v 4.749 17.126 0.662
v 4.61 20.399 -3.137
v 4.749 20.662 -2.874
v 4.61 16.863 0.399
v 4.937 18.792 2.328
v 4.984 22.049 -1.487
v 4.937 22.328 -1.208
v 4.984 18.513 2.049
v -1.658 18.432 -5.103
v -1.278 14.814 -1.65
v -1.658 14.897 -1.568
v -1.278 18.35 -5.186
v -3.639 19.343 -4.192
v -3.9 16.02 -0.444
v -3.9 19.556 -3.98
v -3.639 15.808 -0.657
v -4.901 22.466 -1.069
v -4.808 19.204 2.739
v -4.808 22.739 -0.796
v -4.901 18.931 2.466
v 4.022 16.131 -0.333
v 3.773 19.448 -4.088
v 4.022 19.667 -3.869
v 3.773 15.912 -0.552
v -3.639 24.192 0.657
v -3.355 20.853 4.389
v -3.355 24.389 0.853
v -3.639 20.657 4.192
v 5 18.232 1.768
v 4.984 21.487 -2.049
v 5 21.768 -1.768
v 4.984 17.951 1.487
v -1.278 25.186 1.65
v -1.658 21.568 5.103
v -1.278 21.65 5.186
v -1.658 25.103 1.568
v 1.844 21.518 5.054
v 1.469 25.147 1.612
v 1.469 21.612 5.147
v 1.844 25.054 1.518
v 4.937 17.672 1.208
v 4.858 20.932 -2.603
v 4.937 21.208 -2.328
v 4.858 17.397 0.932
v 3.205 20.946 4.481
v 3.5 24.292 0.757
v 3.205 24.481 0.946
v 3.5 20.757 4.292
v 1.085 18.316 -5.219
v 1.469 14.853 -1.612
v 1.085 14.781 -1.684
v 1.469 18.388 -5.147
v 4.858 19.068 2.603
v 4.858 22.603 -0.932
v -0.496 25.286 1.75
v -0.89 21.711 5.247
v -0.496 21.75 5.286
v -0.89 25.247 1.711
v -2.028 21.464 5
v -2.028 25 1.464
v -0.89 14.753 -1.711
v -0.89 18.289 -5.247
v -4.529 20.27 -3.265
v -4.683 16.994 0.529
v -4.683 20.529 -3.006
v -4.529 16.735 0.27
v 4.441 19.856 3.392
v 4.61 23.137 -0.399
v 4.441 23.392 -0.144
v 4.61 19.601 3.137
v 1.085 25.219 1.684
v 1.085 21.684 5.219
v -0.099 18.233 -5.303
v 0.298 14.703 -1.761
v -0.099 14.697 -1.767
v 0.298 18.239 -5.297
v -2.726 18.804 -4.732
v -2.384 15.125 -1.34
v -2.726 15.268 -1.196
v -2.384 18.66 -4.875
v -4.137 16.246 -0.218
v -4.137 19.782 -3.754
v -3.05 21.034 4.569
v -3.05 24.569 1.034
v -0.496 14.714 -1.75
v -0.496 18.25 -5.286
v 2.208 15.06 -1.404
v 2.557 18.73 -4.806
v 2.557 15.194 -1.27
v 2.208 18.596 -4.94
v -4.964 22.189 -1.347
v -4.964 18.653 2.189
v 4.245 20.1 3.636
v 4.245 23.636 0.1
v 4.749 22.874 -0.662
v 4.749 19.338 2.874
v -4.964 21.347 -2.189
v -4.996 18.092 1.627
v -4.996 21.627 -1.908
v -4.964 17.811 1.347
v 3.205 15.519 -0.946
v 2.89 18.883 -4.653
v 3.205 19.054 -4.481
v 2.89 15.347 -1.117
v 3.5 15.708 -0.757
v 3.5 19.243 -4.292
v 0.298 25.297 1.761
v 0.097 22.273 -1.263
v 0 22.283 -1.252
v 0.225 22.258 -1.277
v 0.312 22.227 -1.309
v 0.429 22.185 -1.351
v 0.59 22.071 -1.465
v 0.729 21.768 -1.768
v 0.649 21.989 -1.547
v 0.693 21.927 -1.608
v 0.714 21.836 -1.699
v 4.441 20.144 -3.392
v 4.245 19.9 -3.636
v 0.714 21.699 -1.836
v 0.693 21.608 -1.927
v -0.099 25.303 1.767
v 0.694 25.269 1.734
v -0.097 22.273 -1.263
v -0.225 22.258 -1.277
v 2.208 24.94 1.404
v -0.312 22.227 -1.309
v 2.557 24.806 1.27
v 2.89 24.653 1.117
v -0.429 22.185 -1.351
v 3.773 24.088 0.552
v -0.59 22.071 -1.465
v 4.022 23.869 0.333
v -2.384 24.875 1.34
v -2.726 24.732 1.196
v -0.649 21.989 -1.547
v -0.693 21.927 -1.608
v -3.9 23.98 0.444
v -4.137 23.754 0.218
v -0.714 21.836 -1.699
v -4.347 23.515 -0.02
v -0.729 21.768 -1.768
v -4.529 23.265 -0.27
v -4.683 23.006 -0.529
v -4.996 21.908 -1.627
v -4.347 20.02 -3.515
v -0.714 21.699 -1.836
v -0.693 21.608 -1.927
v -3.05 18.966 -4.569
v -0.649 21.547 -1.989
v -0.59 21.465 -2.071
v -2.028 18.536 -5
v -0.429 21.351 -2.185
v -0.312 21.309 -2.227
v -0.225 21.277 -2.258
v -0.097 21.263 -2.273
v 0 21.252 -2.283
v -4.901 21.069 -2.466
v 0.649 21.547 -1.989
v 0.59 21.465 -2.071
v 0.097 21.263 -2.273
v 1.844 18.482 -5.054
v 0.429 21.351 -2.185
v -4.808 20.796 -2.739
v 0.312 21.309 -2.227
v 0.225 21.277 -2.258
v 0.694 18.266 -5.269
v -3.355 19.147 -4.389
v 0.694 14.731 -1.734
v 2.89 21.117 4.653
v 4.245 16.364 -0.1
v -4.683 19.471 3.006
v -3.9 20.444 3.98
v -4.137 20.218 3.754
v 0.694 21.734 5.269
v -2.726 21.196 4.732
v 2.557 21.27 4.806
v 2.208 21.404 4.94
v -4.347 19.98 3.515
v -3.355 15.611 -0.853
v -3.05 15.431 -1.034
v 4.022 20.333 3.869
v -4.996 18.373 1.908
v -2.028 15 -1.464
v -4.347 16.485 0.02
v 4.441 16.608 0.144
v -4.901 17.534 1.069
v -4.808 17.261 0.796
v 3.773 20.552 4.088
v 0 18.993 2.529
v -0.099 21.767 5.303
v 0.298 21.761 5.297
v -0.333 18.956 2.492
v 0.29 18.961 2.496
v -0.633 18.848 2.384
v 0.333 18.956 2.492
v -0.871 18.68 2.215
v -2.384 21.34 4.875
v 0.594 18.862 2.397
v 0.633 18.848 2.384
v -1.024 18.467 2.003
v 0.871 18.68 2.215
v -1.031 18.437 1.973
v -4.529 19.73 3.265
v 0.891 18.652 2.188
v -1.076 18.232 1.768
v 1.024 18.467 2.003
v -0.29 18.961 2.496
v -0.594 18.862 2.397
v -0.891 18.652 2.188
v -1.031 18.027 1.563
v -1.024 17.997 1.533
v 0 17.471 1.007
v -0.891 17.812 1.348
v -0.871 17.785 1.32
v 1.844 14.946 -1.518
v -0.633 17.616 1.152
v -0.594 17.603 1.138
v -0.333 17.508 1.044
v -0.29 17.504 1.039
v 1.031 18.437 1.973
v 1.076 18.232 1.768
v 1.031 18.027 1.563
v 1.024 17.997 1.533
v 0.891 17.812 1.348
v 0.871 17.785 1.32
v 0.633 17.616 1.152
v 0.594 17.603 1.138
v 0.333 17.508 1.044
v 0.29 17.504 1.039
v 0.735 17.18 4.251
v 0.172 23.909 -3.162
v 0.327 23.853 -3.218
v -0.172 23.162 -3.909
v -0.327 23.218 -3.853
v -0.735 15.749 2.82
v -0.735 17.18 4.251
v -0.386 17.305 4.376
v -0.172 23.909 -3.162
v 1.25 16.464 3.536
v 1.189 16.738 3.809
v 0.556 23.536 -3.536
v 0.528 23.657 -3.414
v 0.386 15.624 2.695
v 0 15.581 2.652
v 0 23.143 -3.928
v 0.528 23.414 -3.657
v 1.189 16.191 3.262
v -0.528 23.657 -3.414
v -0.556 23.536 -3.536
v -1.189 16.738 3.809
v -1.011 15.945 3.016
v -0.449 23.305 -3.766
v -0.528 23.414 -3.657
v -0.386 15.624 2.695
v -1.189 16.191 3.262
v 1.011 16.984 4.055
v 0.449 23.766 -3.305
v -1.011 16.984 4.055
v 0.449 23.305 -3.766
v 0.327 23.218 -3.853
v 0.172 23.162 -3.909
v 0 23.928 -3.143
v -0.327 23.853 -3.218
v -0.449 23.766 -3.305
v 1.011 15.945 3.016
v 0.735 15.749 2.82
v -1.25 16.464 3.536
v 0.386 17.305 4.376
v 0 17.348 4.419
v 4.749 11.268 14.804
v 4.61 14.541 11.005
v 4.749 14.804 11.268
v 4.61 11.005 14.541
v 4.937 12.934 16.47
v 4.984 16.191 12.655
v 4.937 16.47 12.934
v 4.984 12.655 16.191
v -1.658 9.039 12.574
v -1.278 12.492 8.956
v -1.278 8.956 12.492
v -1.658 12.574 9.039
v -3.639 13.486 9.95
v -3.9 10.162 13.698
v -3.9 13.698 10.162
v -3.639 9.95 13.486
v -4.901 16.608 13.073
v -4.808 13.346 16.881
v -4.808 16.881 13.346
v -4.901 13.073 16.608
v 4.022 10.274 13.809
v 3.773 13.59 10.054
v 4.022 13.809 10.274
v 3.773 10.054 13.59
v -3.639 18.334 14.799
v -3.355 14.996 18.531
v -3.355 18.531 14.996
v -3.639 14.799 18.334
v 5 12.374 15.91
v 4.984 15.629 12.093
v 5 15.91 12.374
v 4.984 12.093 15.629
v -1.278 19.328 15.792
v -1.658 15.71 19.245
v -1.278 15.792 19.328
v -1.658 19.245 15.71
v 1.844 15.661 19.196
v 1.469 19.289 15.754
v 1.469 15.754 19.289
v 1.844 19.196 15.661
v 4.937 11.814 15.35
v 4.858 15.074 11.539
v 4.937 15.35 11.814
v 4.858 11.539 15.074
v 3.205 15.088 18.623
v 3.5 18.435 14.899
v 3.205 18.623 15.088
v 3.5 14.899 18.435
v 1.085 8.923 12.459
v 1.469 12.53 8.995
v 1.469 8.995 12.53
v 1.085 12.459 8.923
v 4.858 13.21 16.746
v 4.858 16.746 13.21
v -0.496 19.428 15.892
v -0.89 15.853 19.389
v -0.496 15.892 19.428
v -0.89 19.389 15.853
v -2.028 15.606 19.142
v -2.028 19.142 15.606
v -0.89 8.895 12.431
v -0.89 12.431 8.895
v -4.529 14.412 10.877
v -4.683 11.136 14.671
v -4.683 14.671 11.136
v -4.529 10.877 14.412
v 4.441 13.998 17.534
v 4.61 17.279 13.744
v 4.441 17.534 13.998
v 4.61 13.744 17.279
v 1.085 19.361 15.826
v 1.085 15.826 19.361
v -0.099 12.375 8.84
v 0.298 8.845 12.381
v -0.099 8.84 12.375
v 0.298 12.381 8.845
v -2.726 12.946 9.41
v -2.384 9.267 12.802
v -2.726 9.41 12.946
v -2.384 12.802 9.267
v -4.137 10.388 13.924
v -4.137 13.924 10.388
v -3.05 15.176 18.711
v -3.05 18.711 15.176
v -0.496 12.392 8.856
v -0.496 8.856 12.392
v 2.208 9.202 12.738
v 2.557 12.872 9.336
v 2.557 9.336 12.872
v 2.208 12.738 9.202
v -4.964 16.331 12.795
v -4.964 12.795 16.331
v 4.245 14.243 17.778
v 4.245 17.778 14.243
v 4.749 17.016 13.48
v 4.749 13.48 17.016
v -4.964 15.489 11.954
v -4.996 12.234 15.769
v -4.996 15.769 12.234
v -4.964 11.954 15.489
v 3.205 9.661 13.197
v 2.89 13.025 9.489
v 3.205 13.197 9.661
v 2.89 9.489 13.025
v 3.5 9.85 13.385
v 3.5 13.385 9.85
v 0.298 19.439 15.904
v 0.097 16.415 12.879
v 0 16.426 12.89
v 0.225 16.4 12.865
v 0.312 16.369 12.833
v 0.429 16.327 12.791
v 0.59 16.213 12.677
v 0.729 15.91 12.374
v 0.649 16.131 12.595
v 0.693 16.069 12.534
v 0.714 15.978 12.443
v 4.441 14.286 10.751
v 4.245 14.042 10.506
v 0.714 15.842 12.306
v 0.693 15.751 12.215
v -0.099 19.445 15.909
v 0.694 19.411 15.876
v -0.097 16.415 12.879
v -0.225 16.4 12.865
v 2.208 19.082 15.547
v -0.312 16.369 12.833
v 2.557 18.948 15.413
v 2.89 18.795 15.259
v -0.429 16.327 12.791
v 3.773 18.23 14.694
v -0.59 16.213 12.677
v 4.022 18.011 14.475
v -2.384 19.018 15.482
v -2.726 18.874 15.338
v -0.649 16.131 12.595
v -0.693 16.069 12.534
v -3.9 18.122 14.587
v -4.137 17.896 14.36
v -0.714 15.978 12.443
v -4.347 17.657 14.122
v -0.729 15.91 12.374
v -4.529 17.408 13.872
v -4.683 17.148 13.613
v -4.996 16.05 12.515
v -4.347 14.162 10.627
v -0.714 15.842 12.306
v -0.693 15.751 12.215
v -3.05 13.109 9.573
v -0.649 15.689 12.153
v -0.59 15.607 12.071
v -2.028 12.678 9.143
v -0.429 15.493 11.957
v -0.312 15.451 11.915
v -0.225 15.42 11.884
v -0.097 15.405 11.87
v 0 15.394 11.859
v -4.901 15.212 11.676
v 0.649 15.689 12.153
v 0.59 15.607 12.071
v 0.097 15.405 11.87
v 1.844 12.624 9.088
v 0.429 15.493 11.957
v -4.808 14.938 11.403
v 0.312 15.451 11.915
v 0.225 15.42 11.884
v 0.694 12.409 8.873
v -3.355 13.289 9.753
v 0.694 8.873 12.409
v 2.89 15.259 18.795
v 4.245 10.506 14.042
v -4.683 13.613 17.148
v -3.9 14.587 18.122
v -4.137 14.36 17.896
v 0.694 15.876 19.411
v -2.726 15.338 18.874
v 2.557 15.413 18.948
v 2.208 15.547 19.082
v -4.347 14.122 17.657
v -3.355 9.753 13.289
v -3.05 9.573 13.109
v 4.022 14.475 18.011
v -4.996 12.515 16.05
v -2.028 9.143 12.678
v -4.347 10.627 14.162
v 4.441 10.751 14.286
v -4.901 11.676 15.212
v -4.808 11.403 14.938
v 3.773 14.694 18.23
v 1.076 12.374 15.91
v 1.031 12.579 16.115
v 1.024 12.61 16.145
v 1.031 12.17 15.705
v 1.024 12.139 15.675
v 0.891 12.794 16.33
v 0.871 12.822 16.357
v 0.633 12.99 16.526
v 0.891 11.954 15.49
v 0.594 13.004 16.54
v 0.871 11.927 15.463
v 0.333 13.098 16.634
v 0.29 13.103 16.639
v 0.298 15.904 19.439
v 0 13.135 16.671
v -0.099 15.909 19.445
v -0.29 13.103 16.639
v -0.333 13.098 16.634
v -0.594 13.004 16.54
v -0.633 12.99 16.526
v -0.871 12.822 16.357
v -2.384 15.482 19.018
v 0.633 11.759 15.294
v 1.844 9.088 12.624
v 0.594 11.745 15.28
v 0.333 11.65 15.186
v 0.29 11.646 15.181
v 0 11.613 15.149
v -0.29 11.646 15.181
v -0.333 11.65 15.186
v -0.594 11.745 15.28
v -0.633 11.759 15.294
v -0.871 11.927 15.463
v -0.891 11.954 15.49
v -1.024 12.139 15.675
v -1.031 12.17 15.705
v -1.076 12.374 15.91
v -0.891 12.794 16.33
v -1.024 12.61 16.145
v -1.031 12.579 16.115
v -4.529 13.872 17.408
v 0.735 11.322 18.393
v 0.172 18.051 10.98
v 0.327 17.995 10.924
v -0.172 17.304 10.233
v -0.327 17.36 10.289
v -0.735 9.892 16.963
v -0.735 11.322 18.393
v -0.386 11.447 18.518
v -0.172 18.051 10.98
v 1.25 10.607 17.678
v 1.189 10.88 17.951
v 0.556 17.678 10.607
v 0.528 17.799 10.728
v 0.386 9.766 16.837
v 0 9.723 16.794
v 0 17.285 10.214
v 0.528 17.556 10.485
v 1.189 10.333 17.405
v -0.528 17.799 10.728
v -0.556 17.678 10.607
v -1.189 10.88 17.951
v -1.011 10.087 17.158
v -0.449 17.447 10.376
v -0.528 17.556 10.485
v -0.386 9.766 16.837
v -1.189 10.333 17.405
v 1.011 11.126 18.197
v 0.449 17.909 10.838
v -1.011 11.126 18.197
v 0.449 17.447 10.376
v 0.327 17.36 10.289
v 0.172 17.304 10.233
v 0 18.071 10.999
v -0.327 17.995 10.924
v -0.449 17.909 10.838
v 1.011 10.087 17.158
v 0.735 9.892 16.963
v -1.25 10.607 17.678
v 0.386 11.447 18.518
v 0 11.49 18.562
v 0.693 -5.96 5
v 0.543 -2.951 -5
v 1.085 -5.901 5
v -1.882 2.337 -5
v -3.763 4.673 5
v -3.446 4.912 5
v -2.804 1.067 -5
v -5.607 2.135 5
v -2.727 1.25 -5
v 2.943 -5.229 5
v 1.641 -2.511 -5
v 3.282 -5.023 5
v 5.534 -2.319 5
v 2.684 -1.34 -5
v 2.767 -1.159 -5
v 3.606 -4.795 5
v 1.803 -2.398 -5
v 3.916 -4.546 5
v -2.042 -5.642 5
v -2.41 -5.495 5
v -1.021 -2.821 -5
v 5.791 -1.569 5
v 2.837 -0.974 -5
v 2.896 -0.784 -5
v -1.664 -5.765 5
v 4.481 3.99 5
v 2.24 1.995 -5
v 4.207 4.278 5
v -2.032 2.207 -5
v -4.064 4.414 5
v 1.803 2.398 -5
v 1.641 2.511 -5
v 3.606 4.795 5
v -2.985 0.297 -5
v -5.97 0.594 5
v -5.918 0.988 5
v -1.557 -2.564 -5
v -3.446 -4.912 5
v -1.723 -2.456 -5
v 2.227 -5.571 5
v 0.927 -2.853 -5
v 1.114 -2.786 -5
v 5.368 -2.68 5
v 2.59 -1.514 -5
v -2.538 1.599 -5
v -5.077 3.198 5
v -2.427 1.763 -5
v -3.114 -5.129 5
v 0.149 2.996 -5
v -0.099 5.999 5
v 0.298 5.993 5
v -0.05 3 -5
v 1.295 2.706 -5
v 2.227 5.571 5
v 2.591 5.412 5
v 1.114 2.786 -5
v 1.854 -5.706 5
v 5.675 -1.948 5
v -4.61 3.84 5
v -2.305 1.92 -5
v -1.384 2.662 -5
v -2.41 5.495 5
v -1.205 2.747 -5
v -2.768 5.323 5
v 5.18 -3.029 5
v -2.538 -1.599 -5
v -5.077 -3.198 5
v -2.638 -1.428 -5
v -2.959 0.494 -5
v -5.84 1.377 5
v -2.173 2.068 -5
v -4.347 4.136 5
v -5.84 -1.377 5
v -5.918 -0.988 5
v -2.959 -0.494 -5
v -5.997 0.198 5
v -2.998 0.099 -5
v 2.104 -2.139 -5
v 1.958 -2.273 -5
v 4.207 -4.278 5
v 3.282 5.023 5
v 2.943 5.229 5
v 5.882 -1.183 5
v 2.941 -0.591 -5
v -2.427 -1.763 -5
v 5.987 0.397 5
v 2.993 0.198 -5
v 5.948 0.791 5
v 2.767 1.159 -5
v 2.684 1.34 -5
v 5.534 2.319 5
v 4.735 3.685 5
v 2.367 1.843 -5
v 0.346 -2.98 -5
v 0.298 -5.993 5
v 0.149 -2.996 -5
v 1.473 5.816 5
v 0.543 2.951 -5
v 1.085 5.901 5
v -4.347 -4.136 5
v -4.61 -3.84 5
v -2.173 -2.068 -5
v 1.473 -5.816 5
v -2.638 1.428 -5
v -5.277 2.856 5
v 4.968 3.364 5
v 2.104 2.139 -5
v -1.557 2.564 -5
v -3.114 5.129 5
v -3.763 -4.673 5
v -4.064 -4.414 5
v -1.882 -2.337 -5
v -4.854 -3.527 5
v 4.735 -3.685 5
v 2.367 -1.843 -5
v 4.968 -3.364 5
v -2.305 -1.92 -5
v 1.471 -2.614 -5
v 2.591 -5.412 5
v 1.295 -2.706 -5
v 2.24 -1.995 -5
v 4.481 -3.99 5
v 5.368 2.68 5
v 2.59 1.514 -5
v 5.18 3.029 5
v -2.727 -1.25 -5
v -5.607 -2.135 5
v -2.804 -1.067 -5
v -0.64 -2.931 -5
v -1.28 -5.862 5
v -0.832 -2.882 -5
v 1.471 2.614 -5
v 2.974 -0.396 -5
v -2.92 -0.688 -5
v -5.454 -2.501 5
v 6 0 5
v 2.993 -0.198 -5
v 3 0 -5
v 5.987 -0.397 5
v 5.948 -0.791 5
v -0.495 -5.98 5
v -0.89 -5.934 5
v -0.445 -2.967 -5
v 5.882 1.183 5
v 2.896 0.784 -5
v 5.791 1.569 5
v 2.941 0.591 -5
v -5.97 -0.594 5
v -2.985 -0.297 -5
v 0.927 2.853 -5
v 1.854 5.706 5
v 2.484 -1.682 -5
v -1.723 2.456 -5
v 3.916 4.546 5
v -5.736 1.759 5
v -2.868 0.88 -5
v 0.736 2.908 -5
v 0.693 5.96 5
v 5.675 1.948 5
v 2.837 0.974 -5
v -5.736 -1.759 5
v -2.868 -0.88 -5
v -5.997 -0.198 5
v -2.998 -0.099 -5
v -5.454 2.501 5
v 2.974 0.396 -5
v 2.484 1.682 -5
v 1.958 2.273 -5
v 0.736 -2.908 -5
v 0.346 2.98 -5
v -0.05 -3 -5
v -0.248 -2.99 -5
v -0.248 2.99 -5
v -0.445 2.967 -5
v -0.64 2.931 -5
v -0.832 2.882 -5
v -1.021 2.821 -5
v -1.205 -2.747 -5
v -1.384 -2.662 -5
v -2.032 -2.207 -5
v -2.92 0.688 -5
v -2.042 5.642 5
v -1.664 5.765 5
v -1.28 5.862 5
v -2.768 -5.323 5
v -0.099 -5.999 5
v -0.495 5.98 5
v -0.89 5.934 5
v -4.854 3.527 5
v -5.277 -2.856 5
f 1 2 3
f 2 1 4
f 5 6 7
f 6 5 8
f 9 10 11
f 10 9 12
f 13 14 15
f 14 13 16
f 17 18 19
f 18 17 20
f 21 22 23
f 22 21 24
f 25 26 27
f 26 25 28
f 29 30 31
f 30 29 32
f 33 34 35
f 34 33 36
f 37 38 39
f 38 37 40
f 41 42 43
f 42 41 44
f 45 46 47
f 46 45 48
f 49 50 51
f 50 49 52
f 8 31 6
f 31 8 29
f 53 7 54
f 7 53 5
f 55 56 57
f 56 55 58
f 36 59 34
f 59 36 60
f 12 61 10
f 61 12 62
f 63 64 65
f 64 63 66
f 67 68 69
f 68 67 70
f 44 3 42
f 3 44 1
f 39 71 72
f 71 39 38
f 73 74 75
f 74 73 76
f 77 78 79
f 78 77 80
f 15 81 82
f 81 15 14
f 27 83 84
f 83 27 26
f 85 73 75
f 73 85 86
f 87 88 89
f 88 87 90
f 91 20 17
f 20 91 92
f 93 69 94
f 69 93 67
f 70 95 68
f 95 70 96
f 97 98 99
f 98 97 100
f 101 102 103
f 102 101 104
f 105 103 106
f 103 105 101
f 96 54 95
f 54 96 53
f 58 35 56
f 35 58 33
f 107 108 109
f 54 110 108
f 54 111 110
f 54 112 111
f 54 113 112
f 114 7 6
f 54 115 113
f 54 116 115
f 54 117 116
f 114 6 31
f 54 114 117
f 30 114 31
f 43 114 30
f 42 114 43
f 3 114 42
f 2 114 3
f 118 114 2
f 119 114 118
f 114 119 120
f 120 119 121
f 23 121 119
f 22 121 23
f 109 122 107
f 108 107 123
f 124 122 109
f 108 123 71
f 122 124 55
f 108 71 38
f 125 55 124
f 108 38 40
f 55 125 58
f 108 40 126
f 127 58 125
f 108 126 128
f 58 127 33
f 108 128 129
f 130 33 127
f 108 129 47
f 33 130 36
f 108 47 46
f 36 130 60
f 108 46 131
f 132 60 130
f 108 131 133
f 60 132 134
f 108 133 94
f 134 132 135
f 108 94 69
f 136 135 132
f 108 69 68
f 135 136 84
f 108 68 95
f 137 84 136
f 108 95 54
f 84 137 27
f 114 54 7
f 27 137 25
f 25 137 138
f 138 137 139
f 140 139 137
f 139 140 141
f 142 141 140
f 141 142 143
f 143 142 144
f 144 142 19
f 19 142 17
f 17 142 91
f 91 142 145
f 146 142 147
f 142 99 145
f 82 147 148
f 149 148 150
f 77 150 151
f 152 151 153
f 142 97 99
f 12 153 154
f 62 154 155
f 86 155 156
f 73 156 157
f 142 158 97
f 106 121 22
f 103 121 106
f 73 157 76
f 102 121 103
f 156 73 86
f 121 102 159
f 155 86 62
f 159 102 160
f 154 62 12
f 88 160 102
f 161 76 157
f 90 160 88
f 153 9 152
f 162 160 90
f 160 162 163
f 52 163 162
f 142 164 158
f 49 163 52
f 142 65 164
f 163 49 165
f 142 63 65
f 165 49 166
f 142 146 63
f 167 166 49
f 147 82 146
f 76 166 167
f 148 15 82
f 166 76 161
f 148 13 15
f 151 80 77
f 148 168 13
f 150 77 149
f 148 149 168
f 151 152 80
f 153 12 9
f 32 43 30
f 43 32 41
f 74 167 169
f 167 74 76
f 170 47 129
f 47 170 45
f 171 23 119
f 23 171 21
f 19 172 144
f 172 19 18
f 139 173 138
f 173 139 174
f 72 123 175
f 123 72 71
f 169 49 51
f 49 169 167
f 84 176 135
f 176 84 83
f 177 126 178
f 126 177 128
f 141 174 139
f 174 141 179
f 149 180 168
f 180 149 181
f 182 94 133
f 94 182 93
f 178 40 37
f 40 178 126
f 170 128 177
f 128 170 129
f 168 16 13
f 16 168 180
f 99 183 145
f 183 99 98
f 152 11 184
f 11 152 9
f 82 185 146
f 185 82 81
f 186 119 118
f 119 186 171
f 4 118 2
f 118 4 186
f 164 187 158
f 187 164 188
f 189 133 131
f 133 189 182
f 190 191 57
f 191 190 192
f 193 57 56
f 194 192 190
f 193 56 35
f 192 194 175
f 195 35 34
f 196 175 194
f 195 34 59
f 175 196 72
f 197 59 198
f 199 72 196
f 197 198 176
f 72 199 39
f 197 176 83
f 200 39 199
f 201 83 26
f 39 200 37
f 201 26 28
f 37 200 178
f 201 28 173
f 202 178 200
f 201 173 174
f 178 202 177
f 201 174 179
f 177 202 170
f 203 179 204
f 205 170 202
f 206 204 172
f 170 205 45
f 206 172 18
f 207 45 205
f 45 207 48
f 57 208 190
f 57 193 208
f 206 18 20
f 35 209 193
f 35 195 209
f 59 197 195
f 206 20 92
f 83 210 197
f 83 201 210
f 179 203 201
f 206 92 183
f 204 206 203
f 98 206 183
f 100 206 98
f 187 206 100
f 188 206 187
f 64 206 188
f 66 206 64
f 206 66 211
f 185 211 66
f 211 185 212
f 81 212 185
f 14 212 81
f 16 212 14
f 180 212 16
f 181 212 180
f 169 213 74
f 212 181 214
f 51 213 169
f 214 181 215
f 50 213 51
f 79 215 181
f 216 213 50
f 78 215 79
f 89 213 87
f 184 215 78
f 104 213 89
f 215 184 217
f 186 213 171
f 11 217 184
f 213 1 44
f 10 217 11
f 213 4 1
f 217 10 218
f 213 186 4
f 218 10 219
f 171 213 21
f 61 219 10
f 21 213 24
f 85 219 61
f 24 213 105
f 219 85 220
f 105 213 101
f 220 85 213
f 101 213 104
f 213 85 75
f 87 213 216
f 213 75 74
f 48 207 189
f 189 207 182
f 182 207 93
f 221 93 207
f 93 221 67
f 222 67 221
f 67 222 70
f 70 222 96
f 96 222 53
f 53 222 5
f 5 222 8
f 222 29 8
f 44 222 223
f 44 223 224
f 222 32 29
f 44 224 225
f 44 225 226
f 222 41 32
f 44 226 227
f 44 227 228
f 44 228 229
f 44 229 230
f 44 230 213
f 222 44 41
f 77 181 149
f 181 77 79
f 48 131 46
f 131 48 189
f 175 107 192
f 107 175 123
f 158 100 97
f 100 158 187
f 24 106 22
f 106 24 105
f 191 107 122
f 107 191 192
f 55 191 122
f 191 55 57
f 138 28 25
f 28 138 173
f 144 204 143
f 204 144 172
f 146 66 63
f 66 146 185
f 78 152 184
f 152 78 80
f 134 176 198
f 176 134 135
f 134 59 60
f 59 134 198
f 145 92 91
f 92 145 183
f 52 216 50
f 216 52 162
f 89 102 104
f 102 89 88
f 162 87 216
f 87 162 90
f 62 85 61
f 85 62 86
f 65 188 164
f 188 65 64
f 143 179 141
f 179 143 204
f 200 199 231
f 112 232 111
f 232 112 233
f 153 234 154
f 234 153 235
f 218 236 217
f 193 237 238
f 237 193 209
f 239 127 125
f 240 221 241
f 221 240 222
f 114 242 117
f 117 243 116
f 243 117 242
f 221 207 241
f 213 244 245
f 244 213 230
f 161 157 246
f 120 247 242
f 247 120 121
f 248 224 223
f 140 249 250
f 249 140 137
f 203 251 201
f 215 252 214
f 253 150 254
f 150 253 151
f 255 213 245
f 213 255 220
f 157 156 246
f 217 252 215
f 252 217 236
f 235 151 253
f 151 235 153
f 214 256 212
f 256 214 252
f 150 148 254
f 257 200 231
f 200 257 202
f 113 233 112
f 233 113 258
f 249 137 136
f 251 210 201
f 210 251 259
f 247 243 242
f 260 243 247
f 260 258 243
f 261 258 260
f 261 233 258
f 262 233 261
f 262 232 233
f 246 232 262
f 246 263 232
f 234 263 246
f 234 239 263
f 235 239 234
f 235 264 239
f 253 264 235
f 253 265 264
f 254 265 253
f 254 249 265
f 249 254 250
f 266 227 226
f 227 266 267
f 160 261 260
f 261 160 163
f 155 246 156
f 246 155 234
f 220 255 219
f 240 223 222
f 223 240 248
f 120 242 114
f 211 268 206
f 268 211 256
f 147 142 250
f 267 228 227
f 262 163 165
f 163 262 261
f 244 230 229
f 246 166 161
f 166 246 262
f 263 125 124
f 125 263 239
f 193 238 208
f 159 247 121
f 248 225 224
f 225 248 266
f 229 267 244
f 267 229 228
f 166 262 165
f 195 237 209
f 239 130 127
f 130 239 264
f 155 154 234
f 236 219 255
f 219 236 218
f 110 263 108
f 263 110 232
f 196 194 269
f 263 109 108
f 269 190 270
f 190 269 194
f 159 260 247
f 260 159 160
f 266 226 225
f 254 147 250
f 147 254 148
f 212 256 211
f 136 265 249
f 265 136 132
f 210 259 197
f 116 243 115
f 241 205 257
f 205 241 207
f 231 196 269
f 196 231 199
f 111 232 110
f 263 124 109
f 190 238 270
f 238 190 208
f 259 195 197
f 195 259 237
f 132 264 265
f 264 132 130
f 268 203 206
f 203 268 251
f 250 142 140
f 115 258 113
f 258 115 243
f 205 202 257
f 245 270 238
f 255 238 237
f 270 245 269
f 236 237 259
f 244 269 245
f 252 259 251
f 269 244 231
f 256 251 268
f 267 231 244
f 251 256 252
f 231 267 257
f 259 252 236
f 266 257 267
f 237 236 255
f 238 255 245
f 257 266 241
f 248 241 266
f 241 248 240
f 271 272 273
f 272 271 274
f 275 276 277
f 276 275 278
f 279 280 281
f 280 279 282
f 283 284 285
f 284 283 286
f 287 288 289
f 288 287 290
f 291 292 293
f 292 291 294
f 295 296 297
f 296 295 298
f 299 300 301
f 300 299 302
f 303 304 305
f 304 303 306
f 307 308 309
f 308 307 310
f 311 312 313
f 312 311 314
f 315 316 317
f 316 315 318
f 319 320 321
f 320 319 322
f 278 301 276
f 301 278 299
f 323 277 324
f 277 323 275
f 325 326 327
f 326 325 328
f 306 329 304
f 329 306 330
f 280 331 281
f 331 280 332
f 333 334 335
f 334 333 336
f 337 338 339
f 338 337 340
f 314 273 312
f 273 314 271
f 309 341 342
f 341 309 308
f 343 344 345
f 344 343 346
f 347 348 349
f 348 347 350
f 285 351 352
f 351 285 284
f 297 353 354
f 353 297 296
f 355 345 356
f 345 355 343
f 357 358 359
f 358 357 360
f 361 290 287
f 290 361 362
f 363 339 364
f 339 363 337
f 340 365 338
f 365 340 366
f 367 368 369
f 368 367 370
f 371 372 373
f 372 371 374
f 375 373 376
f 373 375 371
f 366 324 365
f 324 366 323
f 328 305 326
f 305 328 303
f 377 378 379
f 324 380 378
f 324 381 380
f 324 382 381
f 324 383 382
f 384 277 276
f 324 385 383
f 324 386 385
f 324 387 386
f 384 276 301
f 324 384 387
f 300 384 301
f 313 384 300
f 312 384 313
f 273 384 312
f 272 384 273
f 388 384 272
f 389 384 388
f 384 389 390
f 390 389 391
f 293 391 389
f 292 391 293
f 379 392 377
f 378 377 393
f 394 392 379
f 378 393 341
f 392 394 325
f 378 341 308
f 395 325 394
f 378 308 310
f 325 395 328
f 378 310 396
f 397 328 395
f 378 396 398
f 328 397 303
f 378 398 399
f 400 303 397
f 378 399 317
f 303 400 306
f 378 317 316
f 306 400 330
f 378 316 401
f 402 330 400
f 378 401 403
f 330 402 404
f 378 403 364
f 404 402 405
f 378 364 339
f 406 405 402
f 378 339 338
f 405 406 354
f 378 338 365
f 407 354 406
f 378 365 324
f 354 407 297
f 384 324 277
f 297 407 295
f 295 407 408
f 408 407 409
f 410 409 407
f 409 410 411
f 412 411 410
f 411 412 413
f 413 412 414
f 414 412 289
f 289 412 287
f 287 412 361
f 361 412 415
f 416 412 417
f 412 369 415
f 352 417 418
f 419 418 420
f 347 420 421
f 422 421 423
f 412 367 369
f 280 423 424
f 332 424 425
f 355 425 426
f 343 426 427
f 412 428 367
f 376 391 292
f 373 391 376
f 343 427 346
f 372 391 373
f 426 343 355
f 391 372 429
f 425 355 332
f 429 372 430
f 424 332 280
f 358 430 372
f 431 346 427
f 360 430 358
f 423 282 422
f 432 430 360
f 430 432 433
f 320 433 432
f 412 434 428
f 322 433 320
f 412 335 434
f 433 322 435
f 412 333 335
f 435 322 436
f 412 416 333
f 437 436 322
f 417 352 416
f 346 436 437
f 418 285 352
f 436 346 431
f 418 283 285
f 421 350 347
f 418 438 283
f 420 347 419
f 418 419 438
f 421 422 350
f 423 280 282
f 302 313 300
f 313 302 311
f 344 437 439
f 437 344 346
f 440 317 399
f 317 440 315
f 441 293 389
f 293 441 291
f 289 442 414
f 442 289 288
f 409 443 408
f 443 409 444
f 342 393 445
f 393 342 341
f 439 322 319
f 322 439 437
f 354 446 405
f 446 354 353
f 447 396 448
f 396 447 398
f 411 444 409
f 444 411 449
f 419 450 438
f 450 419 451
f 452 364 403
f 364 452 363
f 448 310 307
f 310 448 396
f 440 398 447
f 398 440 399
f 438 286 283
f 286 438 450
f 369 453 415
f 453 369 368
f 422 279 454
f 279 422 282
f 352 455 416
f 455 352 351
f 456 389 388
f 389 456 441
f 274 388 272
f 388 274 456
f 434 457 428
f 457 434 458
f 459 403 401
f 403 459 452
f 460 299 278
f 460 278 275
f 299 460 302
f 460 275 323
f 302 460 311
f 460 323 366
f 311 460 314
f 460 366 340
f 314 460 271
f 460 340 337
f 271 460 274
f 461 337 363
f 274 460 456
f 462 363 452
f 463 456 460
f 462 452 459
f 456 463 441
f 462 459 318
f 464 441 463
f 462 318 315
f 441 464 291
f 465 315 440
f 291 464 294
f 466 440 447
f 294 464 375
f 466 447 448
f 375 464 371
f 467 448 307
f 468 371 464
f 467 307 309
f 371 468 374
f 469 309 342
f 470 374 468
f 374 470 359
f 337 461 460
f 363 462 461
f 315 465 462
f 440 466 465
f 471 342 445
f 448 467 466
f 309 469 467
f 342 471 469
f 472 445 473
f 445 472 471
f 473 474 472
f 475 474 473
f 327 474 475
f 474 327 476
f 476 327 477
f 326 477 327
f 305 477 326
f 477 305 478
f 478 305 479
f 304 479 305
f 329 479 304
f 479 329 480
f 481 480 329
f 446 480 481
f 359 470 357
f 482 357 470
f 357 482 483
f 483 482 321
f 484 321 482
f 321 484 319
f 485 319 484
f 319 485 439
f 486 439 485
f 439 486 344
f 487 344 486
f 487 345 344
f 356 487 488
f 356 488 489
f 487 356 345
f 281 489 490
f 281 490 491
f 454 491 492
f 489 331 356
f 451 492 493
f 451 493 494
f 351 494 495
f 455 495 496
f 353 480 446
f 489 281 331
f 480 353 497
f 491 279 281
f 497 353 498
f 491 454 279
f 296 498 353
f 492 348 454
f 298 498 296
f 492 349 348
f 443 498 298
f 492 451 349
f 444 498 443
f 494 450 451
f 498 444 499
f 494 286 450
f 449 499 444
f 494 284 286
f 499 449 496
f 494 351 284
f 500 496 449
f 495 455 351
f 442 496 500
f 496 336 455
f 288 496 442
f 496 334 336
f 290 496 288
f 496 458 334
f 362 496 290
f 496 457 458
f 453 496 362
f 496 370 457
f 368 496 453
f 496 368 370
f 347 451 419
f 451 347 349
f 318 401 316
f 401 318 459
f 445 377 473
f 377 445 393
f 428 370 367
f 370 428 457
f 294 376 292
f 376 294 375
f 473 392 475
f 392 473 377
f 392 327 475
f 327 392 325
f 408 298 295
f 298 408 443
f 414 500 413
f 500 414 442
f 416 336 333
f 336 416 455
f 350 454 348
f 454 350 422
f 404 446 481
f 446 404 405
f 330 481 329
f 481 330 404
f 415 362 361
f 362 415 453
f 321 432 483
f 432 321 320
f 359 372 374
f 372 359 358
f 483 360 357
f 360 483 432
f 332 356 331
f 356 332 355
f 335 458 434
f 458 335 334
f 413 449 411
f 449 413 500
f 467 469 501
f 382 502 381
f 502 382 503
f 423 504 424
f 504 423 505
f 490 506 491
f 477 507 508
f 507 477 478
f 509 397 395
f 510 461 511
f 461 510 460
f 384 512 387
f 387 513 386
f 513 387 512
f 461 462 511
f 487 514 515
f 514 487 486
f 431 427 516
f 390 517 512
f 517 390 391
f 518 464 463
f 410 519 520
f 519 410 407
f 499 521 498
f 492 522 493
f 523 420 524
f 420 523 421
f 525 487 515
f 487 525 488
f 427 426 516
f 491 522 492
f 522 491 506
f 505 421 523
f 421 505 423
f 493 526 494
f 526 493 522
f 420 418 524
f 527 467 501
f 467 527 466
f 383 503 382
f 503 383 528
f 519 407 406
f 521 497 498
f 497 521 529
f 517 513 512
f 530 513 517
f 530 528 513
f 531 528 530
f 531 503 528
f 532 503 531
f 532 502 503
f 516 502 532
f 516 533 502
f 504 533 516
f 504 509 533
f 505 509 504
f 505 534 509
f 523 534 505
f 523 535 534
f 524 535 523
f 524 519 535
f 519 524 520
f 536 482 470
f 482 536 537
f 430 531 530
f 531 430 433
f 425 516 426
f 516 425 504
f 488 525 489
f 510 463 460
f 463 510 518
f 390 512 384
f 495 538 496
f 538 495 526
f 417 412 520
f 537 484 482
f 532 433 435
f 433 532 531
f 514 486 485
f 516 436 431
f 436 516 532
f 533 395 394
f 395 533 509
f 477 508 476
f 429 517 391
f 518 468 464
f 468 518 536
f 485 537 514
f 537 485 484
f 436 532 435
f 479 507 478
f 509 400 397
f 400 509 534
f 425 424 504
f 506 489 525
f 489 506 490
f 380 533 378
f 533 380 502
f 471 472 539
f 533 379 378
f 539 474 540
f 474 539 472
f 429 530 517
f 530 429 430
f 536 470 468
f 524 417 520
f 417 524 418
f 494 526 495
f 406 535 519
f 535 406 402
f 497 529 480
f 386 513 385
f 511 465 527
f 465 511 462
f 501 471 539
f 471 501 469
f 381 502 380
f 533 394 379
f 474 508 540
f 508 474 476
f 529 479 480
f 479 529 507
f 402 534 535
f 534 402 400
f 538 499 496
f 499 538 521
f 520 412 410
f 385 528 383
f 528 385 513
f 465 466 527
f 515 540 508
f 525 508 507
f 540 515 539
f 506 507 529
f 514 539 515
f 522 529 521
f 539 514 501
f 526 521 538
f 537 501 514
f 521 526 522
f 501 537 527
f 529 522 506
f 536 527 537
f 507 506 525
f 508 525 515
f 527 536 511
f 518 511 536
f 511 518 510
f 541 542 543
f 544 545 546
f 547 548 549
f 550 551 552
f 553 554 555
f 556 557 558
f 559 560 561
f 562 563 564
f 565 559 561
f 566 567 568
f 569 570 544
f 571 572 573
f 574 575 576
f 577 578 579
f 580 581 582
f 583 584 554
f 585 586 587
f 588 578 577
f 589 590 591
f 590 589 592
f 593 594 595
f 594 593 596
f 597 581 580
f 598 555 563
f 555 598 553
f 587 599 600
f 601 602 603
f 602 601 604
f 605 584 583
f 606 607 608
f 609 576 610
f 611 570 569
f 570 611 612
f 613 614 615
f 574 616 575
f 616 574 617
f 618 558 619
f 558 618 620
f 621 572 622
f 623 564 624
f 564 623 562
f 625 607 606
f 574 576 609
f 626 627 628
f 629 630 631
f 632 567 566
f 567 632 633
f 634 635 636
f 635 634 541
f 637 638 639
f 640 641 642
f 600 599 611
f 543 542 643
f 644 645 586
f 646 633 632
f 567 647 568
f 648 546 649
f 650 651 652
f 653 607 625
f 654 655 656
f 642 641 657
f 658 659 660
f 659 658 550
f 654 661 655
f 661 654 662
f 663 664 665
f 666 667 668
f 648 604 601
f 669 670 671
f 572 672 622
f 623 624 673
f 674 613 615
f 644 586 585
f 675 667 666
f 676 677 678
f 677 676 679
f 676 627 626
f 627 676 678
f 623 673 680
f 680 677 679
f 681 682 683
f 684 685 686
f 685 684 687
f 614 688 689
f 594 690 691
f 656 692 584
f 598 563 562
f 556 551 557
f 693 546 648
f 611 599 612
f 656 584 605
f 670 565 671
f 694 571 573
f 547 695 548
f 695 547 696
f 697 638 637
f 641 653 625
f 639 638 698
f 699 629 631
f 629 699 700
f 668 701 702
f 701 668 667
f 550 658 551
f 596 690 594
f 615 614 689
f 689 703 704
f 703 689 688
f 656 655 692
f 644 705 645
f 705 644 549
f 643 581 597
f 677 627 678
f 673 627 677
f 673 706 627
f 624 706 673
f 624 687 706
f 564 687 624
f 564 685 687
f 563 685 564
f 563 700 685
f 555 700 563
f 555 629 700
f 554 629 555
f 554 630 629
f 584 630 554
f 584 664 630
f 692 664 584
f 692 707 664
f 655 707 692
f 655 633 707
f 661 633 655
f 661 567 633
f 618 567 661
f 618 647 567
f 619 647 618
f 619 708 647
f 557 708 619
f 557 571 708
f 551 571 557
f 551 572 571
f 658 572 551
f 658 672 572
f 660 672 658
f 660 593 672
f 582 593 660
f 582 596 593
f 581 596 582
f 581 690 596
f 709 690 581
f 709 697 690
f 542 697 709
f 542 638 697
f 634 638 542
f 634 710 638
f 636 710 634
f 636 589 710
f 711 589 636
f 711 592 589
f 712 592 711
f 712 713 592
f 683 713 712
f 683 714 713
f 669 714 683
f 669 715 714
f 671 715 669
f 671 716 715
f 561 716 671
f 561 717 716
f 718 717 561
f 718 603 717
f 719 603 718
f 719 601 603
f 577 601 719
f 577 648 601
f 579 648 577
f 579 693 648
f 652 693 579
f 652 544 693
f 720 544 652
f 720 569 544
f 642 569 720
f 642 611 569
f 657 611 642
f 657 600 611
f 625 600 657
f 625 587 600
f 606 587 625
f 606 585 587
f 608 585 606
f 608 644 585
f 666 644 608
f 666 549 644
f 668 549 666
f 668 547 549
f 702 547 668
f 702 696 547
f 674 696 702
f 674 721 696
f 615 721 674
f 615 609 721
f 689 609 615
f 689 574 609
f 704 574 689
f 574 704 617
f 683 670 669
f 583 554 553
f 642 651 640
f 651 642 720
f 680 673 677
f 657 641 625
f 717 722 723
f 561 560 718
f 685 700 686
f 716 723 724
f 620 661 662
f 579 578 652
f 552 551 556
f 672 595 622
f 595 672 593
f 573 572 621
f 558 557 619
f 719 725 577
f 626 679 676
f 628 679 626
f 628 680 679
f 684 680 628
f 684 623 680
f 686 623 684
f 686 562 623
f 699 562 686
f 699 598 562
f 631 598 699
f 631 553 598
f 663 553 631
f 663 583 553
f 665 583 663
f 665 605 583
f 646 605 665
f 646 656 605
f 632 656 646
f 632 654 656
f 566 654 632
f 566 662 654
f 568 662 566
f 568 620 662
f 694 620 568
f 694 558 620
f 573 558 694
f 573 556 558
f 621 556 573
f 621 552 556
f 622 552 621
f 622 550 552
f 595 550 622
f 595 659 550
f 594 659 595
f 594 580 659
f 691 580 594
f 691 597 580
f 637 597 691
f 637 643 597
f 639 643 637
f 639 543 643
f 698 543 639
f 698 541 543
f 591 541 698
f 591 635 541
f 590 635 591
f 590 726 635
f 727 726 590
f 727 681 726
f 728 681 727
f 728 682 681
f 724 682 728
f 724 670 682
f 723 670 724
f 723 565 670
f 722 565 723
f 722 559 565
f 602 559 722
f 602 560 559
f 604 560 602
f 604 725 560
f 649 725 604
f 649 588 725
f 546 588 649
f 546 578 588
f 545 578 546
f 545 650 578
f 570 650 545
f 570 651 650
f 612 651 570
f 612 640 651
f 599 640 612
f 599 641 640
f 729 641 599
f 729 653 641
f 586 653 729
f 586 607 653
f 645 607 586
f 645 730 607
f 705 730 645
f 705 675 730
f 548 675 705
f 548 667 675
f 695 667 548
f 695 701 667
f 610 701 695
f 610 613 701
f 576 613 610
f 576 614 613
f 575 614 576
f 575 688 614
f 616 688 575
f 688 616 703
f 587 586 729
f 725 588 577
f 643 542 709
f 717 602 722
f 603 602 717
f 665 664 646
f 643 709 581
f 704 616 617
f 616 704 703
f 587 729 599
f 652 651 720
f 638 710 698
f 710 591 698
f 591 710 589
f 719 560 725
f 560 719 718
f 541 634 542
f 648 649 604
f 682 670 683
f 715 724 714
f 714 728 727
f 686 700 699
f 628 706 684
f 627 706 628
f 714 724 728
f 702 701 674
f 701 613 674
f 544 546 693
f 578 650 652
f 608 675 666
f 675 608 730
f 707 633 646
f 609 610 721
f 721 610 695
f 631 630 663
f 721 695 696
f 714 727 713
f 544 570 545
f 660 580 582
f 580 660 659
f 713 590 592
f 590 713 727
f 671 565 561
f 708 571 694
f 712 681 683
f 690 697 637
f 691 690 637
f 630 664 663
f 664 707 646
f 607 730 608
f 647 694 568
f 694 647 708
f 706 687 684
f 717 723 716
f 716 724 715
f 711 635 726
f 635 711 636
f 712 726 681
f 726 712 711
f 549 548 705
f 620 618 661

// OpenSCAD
/*
This raises the question of whether objects can be rotated and moved at the same time.
The answer is yes, as partly stated above. However, the open question is whether translation and rotation are commutative or not.
Remember: an operation is considered commutative if the order of its parameters can be
exchanged without affecting the result. A classic example would be multiplication - a*b and
b*a return an identical result, so the operation is commutative.

The simplest way to check the behavior is to create two objects as above and swap the
order of the operators once per creation operation. If the two are "on top of each other",
operations are commutative - if we see two elements, the operation is not commutative.
To keep the example "compact", the author would like to anticipate advanced experiments
with the description language at this point and declare a module:
*/
$fa = 1;
$fs = 0.4;

module tamsDreidel(dia=22) {
    cylinder(dia,dia,dia,true);
    cylinder(dia*2,dia/9,dia/4,true);
}

color("blue") {
    cylinder(h=10,r1=3,r2=6,center=true);
}

color("white") {
    translate([0,20,0]) {
        rotate([45,0,0]) {
            tamsDreidel(5);
        }
    }
}

color("grey"){
    rotate([45,0,0]){
        translate([0,20,0]) {
            tamsDreidel(5); 
        }
    }
}
